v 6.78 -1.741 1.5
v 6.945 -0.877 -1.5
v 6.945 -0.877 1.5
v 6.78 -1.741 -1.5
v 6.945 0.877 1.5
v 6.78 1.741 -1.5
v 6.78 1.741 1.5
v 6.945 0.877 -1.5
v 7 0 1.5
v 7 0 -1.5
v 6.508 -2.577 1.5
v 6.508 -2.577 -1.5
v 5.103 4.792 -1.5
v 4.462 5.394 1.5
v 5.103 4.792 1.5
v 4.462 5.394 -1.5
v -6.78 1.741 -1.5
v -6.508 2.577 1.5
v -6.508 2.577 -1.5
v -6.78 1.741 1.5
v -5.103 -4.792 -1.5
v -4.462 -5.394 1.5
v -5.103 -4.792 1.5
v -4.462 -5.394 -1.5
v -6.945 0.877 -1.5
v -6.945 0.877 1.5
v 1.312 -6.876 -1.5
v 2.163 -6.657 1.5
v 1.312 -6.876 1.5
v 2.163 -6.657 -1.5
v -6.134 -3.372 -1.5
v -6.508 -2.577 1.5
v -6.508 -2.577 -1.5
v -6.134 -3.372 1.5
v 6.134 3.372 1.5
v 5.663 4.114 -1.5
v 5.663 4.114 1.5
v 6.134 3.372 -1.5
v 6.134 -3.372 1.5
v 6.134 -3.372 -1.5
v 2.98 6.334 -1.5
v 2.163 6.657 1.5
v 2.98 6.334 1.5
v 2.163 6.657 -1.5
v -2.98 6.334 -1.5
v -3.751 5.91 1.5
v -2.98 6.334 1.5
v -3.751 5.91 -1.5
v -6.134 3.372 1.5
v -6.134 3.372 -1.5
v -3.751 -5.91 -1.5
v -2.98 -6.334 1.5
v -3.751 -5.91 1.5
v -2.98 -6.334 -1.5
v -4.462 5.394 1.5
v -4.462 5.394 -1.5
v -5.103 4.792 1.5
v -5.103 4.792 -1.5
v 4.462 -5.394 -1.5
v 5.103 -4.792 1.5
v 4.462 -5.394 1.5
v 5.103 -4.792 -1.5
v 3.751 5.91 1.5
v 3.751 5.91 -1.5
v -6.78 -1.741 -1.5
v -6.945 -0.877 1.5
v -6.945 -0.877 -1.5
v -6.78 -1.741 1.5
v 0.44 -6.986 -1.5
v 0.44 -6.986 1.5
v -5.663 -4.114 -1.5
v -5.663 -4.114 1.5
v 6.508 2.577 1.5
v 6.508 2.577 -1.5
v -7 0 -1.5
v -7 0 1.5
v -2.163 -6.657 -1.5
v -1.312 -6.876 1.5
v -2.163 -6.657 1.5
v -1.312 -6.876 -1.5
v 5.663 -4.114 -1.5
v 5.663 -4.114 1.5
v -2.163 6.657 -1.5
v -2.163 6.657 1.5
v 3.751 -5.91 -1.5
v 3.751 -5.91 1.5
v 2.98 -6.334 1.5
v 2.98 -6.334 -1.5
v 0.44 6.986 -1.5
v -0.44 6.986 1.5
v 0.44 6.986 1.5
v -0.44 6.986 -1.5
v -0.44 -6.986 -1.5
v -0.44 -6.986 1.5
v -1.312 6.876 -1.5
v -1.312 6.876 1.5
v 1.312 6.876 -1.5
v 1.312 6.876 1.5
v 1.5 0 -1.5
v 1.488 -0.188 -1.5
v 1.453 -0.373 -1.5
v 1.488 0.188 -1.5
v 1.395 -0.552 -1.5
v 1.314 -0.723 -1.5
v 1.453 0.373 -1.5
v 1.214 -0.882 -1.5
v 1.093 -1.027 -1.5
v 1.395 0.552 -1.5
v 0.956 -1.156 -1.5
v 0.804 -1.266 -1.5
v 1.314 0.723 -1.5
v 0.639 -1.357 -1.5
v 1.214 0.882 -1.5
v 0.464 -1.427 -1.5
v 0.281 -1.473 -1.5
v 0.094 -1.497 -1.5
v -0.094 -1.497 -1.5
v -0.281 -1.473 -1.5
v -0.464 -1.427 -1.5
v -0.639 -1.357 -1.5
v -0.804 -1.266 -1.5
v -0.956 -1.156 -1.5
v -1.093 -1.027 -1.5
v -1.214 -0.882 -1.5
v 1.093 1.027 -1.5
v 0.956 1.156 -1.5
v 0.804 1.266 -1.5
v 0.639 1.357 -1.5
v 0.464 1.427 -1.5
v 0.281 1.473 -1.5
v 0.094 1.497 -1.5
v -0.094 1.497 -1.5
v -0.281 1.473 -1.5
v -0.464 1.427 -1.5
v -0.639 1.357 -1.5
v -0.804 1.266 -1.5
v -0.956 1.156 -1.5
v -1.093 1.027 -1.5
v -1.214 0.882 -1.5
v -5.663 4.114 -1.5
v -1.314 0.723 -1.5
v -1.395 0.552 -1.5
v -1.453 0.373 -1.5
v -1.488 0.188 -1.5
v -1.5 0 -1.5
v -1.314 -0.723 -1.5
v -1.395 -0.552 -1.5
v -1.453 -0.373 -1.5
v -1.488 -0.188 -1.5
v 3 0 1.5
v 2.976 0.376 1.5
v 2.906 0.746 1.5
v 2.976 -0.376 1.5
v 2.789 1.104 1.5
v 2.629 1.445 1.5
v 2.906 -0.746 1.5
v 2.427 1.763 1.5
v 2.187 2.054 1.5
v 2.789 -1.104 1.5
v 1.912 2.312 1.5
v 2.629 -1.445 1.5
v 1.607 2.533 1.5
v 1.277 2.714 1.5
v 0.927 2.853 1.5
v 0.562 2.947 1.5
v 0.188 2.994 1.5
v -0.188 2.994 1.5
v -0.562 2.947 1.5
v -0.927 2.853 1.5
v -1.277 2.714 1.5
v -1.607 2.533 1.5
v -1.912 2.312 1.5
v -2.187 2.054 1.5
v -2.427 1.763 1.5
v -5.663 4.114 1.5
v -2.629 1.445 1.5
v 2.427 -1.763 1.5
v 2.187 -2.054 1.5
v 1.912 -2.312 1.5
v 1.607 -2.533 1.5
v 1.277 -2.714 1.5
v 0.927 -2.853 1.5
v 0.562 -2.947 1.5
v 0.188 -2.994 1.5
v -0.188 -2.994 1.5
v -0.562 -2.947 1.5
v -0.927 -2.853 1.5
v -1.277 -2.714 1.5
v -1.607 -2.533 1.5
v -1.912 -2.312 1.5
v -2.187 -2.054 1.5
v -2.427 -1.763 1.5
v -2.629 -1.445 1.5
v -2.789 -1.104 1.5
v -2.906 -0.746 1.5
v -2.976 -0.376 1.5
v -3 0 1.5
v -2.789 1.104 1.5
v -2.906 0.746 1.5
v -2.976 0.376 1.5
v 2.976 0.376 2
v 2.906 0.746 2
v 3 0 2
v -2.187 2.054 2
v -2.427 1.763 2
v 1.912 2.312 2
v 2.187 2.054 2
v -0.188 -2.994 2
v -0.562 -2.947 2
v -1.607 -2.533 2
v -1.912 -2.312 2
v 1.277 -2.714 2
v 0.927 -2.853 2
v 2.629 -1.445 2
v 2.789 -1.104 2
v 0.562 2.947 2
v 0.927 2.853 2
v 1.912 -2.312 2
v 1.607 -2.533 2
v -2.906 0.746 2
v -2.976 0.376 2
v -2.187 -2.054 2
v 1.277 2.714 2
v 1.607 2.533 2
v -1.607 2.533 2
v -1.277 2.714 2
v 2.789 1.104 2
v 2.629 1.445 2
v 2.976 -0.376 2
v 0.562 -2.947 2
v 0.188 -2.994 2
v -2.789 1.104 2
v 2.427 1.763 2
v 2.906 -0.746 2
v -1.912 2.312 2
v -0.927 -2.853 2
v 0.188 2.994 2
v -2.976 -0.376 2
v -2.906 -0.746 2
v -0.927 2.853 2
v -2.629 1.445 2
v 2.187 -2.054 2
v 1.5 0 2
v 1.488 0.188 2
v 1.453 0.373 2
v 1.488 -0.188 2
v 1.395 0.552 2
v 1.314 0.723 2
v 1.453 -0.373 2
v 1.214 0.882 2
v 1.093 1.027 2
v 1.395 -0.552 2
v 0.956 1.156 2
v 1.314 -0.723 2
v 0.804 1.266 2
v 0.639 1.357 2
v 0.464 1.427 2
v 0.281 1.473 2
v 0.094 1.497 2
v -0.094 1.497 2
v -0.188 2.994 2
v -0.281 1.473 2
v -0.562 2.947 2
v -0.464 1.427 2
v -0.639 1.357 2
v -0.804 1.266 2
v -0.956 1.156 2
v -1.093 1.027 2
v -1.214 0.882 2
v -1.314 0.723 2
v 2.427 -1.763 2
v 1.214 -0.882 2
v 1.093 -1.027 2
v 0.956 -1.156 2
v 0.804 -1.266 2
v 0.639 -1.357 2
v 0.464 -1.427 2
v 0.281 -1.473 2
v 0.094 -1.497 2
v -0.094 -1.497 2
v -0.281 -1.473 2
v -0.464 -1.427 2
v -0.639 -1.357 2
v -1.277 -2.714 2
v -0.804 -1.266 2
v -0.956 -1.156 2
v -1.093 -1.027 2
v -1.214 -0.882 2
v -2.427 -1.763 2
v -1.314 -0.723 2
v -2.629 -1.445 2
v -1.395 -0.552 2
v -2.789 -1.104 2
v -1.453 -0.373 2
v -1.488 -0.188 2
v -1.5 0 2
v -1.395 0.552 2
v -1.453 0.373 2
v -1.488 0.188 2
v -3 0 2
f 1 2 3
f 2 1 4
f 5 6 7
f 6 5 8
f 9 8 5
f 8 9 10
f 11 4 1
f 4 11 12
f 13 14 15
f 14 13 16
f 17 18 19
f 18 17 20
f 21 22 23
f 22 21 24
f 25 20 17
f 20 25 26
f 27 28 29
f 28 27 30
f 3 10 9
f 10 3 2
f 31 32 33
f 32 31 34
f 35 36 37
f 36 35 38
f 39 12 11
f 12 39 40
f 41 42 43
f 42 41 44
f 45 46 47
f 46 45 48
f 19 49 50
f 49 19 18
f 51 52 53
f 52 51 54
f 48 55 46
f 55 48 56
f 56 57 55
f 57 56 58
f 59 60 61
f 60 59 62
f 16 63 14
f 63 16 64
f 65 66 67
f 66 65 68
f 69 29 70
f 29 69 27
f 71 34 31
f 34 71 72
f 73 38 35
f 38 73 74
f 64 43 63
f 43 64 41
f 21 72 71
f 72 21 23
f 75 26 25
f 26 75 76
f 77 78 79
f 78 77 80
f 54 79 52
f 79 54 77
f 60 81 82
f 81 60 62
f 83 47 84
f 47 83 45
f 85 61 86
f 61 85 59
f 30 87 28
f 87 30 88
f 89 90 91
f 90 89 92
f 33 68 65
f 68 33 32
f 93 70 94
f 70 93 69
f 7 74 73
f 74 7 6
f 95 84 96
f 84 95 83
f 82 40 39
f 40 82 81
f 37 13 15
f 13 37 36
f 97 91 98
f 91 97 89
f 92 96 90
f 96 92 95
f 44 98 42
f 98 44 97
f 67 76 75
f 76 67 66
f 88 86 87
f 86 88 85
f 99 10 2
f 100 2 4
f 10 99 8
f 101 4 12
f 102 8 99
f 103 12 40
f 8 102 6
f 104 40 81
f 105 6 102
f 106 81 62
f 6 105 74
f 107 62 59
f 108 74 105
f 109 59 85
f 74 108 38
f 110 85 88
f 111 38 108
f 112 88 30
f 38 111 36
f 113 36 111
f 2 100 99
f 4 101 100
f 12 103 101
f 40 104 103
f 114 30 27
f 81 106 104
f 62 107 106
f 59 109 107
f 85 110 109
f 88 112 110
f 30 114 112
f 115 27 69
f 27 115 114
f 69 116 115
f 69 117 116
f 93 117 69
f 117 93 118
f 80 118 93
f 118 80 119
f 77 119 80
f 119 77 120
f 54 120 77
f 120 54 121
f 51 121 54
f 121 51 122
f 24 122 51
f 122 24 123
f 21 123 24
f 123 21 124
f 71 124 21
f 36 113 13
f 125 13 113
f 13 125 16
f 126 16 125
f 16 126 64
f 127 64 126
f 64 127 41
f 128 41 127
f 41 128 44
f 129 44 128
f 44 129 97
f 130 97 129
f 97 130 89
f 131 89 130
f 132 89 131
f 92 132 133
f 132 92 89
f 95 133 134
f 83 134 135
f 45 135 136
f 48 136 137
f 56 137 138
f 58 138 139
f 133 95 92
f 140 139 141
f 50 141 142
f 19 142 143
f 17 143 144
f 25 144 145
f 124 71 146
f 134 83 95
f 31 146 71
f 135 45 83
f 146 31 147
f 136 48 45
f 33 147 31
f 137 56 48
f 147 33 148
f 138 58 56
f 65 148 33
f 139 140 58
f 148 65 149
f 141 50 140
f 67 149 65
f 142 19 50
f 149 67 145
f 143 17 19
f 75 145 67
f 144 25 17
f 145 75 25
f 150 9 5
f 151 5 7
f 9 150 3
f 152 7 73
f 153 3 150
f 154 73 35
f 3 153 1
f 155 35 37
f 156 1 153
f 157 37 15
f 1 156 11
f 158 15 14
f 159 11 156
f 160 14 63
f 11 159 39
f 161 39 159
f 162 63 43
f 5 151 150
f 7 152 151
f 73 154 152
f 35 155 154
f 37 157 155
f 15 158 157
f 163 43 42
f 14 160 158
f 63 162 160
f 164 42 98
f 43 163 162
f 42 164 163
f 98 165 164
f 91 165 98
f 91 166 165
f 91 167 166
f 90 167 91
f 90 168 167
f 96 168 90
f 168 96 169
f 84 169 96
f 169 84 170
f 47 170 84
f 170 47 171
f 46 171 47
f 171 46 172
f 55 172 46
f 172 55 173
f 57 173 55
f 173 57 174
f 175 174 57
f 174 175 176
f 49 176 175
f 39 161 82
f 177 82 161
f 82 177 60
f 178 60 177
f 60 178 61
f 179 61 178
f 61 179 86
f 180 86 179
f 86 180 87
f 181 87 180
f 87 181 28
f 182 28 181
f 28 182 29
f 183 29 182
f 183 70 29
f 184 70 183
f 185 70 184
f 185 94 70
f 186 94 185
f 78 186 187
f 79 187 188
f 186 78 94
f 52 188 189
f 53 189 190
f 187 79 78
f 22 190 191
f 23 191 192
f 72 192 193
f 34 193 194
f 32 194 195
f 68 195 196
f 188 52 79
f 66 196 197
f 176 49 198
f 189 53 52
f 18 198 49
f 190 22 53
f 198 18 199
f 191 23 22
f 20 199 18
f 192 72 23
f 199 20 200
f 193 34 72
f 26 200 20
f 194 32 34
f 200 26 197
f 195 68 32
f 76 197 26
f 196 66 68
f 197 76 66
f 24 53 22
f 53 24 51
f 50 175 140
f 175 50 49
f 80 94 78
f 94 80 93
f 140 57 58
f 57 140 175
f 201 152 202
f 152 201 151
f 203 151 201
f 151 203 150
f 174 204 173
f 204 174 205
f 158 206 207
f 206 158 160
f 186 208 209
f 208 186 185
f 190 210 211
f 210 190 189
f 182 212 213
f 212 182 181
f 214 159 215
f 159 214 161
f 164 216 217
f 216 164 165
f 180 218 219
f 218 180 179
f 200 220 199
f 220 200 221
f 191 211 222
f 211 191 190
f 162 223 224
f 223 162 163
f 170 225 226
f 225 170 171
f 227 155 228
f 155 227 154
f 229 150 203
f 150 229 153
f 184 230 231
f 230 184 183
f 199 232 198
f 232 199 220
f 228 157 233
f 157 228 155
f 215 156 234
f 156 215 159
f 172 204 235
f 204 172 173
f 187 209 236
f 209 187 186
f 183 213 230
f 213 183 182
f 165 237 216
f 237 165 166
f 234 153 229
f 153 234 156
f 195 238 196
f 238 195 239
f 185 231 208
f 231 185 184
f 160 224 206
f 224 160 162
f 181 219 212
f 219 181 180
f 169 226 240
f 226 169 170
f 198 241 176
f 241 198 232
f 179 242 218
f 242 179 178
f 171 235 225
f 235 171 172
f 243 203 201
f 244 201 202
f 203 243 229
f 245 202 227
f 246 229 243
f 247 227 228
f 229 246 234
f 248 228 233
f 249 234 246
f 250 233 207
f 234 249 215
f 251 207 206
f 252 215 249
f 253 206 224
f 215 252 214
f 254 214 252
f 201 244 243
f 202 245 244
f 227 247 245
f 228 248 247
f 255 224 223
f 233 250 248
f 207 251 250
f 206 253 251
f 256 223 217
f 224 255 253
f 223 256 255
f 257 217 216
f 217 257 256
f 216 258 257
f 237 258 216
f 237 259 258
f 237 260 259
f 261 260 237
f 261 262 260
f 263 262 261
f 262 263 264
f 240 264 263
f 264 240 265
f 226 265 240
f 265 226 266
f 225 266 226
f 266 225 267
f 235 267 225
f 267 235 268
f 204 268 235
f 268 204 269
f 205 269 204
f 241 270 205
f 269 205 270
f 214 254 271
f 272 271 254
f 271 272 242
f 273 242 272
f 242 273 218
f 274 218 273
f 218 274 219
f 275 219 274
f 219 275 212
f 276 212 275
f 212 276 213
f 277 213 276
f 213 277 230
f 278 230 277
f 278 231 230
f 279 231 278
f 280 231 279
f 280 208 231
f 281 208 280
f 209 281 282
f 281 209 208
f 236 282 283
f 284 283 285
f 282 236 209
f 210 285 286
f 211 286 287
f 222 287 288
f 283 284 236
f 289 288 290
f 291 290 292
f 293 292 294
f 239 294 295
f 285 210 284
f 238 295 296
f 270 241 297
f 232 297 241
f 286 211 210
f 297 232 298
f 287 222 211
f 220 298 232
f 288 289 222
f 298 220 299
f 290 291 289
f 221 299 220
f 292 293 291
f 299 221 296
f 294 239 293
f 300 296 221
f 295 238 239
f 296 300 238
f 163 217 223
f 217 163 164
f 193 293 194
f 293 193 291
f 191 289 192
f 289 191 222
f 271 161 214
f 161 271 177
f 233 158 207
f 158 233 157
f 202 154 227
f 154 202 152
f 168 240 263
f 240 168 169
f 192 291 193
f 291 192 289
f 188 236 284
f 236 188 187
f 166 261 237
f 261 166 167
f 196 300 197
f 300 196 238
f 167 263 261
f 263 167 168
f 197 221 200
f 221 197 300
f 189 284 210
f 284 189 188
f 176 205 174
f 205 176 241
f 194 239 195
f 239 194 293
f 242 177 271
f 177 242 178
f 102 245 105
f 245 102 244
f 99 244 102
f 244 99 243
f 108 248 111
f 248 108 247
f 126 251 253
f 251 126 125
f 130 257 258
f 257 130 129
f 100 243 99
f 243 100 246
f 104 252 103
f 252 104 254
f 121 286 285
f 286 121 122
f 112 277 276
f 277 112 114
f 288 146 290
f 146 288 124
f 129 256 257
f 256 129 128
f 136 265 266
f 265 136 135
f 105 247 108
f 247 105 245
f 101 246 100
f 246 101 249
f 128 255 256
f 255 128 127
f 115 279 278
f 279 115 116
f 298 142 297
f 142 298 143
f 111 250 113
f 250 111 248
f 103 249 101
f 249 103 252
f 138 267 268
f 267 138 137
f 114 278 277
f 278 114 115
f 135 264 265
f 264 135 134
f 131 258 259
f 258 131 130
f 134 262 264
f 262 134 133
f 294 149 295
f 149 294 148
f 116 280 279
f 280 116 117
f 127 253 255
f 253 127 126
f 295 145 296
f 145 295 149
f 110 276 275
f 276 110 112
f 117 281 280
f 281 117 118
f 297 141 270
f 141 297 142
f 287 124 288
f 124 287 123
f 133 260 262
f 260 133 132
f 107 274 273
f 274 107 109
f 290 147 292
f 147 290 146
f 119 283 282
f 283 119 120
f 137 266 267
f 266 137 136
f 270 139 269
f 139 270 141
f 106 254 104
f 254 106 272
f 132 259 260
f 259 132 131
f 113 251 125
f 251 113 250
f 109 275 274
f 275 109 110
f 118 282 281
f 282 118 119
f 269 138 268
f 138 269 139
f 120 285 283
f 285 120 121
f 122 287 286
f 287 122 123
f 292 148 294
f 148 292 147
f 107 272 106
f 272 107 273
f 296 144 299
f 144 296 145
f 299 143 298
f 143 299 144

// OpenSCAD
$fn = 50;


difference() {
	union() {
		translate(v = [0, 0, -1.5000000000]) {
			cylinder(h = 3, r = 7.0000000000);
		}
		translate(v = [0, 0, -1.5000000000]) {
			cylinder(h = 3.5000000000, r = 3.0000000000);
		}
	}
	union() {
		translate(v = [0, 0, -50.0000000000]) {
			cylinder(h = 100, r = 1.5000000000);
		}
	}
}
